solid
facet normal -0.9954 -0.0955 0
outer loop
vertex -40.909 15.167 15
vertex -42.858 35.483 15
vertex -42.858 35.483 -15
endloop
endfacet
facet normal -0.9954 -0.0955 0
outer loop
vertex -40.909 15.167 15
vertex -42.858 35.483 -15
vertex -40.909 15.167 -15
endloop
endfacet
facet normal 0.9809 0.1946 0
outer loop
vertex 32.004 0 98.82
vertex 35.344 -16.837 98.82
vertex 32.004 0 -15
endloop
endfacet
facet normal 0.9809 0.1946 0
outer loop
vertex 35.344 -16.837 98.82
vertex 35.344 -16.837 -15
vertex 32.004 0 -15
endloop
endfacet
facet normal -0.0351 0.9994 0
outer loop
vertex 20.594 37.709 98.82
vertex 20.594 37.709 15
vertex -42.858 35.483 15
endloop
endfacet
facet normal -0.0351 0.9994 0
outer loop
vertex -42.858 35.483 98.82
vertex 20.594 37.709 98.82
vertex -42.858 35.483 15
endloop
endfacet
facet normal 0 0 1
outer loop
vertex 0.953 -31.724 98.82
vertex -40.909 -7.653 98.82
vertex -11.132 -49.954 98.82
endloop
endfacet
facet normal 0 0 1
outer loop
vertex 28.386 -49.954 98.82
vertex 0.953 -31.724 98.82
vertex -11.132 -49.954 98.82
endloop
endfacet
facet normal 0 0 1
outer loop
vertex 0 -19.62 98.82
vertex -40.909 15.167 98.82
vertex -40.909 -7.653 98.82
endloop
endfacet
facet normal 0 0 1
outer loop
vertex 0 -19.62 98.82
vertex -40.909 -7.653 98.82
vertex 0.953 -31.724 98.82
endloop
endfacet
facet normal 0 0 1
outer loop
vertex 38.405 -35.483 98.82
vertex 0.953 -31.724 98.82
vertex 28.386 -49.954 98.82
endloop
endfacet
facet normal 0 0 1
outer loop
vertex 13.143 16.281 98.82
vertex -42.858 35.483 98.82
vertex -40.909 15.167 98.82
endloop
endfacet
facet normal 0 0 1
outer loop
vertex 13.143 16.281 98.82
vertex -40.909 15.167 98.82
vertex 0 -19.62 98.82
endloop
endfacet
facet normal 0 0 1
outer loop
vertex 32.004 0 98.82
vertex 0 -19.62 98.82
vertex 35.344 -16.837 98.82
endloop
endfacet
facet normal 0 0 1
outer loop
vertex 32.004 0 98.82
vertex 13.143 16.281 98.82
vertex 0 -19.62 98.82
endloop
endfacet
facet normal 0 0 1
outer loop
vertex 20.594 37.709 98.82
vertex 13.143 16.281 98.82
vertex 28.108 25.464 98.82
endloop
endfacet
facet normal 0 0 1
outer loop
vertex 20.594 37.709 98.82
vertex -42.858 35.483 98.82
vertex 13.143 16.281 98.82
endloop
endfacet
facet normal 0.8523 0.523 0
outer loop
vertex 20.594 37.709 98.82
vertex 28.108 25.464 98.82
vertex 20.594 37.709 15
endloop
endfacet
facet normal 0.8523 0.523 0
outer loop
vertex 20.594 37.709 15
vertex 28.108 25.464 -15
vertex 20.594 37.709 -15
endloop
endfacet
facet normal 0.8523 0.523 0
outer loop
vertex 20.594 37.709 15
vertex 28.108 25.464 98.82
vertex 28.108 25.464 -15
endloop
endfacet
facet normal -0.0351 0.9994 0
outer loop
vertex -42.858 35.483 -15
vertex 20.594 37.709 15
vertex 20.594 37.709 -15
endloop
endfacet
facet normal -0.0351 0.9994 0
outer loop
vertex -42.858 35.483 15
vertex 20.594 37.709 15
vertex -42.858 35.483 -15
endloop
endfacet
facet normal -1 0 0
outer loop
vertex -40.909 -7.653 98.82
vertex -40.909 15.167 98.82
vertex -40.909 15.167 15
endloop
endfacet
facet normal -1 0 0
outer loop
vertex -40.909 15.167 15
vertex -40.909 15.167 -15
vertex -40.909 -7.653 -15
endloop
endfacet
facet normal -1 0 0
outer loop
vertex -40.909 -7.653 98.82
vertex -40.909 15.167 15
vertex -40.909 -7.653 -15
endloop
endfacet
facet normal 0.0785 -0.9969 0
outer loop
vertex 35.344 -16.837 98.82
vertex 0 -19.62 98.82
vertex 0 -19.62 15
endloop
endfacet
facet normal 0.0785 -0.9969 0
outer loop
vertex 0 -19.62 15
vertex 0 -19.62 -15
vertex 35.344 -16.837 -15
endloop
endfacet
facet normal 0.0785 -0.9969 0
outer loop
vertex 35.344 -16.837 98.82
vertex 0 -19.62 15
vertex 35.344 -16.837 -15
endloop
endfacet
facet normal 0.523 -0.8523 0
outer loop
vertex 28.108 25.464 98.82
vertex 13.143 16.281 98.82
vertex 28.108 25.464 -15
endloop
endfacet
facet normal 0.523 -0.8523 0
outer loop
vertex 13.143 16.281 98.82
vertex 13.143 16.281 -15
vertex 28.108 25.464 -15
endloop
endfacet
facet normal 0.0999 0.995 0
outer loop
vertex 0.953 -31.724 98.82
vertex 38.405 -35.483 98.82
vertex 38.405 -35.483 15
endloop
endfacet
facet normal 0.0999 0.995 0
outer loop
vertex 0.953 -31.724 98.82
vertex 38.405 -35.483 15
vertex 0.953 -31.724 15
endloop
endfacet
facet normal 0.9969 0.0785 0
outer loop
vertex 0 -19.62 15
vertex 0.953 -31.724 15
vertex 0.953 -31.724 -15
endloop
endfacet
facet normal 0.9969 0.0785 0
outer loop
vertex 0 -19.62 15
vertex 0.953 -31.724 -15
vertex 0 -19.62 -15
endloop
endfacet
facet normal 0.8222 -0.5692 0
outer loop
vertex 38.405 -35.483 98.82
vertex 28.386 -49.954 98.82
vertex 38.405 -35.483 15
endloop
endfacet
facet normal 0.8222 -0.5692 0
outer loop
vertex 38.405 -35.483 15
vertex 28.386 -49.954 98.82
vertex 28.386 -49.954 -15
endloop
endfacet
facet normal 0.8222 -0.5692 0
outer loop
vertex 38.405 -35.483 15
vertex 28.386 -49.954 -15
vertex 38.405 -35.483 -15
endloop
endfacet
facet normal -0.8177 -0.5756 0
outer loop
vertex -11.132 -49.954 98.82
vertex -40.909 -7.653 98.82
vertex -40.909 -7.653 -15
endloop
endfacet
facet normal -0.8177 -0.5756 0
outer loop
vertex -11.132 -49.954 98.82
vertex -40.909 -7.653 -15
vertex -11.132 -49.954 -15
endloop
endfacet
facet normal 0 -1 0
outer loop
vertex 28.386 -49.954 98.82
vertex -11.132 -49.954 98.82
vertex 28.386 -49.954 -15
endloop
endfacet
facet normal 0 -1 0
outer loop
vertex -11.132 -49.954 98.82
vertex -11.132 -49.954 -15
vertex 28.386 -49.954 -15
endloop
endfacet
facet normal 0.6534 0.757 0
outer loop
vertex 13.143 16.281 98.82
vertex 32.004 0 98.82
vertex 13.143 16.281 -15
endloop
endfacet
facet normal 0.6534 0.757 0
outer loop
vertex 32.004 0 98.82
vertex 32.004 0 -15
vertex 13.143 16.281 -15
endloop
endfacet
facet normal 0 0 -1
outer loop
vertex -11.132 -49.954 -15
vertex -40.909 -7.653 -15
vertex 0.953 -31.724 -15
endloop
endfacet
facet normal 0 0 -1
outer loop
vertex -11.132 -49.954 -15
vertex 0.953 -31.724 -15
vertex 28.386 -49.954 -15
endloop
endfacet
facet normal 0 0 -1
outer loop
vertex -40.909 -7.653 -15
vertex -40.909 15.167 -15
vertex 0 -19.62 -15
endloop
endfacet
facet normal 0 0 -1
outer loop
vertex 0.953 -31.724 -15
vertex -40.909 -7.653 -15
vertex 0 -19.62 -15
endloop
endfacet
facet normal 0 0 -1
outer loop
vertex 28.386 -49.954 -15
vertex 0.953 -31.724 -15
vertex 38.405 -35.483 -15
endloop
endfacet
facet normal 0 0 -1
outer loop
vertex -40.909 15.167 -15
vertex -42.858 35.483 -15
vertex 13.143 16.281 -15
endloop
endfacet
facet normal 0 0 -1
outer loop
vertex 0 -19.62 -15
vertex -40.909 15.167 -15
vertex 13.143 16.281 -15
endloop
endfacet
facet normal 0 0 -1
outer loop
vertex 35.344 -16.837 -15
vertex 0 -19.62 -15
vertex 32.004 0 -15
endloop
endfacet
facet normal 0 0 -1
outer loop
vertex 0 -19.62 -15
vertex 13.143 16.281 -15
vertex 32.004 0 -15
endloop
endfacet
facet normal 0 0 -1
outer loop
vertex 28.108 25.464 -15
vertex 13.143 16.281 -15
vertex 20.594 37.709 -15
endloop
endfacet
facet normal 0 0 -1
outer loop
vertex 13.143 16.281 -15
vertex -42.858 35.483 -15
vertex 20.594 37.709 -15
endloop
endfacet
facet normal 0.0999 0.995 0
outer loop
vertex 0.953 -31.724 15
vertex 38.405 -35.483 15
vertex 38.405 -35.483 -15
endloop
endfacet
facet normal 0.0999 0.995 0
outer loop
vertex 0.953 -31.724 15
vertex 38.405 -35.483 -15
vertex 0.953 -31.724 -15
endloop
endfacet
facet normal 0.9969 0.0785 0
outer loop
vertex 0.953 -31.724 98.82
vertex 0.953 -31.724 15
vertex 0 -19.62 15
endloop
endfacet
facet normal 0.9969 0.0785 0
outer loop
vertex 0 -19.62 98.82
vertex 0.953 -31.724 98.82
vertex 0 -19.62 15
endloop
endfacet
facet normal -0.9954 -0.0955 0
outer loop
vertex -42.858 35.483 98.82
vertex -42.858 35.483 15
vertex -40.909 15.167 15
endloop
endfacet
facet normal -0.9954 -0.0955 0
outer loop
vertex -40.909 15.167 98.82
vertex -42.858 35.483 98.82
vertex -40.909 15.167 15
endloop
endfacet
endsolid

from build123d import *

# Parameters (mm, degrees)
F1_DEPTH = 15
F2_DEPTH = 83.82


with BuildPart() as f1:
    # F0 (on Top) → F1 (new body, symmetric)
    with BuildSketch(Plane.XY):
        Polygon((20.593876, 37.709061), (-42.857531, 35.482697), (-40.909462, 15.167112), (-40.909462, -7.65313), (-11.131826, -49.954068), (28.386155, -49.954068), (38.404796, -35.482697), (0.953089, -31.724066), (0, -19.619845), (35.34355, -16.836887), (32.003999, 0), (13.142763, 16.280918), (28.107863, 25.464052), align=None)
    extrude(amount=F1_DEPTH, both=True)

    # F1_face (on face) → F2 (join)
    with BuildSketch(Plane(origin=(-4.856756, -2.869367, 15), x_dir=(1, 0, 0), z_dir=(0, 0, 1))):
        Polygon((5.809844, -28.854699), (4.856756, -16.750478), (40.200306, -13.96752), (36.860755, 2.869367), (17.999519, 19.150285), (32.964619, 28.333419), (25.450632, 40.578428), (-38.000776, 38.352064), (-36.052706, 18.036479), (-36.052706, -4.783763), (-6.27507, -47.084701), (33.242911, -47.084701), (43.261552, -32.61333), align=None)
    extrude(amount=F2_DEPTH)


solid = f1.part
